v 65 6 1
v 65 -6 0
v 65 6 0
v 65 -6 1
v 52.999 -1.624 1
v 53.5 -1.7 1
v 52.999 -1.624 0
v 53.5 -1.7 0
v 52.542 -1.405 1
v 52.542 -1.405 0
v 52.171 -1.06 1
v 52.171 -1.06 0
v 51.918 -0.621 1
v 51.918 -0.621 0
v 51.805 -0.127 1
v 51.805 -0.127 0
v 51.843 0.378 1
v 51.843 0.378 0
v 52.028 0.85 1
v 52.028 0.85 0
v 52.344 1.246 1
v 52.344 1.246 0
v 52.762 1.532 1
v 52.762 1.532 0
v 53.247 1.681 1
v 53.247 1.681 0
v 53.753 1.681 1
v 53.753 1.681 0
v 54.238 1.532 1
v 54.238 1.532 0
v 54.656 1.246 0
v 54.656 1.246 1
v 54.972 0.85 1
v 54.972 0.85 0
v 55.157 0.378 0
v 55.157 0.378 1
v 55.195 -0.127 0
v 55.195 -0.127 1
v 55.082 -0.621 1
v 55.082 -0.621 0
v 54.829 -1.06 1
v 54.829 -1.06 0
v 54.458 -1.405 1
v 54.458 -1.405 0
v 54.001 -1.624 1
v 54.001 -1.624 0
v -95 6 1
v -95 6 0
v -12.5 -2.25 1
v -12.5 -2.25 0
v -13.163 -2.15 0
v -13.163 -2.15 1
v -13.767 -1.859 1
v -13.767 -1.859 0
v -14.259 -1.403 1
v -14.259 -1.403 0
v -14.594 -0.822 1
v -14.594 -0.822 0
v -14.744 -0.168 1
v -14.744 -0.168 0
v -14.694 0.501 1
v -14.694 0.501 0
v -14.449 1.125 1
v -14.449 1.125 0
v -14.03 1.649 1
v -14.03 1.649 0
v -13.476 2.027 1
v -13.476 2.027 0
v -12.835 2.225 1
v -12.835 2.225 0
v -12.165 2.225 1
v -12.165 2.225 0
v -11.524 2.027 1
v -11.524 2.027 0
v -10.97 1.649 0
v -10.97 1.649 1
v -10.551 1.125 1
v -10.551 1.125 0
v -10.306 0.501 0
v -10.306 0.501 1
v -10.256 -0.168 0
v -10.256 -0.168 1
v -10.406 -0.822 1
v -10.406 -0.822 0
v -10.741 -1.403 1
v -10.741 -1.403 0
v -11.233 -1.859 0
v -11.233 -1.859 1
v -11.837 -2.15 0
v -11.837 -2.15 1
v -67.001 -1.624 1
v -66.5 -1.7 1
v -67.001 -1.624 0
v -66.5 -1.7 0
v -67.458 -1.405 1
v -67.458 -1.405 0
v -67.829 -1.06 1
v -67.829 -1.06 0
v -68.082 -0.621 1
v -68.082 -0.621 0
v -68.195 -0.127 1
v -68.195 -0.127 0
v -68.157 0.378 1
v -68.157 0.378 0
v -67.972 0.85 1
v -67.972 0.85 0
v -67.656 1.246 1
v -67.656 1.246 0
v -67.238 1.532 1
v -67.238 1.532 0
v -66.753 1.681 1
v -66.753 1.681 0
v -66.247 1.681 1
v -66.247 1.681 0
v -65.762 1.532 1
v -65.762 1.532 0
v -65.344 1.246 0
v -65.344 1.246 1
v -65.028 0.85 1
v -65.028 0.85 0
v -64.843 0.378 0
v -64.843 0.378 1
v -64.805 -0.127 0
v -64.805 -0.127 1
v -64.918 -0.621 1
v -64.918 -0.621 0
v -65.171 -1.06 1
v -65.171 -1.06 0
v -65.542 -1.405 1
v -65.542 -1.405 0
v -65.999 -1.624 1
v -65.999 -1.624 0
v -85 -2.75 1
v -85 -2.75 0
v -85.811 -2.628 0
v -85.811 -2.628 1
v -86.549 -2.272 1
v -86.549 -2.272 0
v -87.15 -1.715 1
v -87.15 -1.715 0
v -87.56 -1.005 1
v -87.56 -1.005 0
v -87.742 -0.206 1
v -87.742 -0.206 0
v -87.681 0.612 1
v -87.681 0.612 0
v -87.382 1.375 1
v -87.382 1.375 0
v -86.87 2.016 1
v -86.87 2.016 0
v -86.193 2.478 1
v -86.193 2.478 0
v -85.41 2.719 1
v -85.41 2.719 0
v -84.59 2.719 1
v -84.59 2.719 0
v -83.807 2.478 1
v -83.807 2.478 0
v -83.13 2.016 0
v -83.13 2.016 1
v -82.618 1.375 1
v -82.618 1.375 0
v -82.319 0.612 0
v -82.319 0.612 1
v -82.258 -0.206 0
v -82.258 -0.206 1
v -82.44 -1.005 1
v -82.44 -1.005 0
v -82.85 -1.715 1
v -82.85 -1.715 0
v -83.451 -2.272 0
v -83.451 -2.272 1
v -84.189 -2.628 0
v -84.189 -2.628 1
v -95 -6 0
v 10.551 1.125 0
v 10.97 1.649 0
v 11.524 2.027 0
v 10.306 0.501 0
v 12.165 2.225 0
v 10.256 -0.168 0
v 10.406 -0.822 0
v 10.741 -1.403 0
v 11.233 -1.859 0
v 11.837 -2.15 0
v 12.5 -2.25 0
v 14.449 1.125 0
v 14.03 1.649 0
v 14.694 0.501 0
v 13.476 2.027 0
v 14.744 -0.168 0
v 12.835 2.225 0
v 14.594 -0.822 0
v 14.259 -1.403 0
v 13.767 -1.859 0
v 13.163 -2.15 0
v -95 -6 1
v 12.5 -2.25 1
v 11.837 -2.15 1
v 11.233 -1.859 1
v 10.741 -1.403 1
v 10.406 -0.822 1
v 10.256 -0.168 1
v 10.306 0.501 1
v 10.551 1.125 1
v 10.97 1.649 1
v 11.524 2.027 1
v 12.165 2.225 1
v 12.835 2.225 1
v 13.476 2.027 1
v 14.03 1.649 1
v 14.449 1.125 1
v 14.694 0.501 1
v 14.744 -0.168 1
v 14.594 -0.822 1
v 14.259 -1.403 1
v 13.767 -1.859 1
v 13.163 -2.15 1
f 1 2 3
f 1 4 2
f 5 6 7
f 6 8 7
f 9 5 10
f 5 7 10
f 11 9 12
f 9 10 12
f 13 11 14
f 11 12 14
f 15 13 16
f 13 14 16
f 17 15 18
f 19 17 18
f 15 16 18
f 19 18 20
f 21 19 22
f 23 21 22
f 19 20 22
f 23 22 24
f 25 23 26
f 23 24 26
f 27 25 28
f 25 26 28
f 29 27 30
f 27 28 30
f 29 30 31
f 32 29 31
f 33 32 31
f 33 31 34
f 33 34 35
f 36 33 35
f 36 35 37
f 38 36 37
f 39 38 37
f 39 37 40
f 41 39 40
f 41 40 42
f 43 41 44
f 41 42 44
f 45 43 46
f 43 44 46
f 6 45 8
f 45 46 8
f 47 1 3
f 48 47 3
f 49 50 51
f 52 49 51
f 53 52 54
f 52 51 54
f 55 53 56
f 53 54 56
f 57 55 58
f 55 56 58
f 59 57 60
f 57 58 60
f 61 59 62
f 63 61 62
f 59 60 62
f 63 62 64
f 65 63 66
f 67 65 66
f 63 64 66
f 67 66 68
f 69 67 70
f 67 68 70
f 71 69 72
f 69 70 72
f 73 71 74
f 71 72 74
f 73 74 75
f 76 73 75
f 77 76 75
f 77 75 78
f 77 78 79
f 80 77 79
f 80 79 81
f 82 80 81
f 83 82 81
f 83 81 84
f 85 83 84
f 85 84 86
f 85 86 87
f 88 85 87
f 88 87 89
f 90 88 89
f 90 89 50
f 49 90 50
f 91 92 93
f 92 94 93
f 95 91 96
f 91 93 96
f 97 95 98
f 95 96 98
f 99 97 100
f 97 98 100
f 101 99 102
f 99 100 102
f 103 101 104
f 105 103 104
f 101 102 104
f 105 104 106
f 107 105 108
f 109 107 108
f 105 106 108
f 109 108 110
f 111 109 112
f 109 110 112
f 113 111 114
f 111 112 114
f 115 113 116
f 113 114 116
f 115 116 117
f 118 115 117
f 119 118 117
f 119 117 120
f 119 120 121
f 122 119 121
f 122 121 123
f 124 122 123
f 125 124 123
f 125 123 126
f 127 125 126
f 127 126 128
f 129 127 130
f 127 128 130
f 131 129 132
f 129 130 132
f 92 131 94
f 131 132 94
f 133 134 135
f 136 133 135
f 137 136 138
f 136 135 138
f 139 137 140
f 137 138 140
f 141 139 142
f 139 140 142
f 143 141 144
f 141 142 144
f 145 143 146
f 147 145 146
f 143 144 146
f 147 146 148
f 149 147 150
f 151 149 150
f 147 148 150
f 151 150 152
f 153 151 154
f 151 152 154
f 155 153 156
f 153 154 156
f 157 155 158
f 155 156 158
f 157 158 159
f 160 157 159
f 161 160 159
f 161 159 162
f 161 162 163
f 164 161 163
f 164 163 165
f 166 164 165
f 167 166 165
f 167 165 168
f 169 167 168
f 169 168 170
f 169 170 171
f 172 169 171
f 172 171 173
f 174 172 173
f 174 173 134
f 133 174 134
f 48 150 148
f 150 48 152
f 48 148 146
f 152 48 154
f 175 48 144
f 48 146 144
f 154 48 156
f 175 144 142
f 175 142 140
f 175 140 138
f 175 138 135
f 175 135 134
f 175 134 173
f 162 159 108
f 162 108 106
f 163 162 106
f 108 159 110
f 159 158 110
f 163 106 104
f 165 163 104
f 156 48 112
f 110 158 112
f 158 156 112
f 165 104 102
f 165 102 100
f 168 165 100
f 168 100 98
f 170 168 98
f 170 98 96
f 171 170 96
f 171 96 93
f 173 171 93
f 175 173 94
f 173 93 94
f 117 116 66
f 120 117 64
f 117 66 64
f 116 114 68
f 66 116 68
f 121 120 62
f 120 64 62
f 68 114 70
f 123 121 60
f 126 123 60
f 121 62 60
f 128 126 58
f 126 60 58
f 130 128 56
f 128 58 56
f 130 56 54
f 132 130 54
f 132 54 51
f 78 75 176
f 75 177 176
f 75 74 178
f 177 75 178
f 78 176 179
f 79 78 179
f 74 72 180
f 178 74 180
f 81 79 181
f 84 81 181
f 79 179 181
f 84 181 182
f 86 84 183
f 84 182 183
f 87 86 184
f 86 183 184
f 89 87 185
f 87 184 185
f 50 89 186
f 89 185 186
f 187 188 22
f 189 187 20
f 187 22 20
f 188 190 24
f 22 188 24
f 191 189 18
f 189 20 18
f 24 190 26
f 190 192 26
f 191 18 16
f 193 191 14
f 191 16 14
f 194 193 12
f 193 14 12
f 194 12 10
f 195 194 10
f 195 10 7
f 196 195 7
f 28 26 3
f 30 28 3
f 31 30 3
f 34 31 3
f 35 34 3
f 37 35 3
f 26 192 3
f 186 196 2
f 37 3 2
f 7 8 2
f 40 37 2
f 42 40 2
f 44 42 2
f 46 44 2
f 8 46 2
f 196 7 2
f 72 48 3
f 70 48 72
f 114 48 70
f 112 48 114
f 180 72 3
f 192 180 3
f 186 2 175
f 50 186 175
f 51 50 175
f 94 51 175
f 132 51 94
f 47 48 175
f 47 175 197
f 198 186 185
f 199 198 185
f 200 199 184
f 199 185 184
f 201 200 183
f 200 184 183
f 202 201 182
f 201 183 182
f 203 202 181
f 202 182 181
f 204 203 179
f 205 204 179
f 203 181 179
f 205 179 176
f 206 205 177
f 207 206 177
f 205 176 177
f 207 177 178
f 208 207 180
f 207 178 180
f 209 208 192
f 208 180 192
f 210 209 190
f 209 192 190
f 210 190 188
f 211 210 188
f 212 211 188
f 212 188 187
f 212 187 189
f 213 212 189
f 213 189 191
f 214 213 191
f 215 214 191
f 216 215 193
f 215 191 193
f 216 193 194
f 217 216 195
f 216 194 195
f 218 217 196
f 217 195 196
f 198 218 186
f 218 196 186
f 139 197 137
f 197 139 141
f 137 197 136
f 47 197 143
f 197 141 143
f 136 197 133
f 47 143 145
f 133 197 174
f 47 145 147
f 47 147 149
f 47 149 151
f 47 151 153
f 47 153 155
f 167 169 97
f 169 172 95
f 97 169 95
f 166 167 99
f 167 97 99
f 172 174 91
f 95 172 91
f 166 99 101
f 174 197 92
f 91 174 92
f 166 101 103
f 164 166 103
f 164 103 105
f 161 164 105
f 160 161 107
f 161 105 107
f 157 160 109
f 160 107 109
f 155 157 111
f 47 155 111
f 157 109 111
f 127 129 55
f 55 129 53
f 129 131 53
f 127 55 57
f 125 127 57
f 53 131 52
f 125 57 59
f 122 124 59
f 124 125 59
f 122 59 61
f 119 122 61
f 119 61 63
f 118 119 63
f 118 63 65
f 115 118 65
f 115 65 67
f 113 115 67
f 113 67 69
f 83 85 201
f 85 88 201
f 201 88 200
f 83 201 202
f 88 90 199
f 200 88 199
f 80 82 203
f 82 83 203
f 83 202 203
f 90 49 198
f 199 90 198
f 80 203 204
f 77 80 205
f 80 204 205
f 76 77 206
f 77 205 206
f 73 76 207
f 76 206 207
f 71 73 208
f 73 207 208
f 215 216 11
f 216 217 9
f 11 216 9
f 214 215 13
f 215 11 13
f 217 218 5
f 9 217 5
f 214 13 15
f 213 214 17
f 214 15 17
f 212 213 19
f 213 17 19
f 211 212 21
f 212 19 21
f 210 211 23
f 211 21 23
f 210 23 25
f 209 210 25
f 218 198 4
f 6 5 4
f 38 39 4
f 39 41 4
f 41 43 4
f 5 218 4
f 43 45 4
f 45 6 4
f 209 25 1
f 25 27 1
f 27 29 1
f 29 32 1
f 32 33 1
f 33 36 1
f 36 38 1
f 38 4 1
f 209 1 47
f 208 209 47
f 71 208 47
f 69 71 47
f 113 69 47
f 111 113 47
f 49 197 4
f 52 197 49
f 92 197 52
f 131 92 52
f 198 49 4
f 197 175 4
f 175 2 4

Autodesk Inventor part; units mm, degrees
ref_plane "YZ Plane" through (0, 0, 0) normal (1, 0, 0) x (0, 1, 0)
ref_plane "XZ Plane" through (0, 0, 0) normal (0, 1, 0) x (-1, 0, 0)
ref_plane "XY Plane" through (0, 0, 0) normal (0, 0, 1) x (1, 0, 0)
sketch "Sketch1" plane through (0, 0, 0) normal (0, 0, 1) x (1, 0, 0)
  line L0 (-75, -6) -> (75, -6)
  line L1 (75, -6) -> (75, 6)
  line L2 (75, 6) -> (-75, 6)
  line L3 (-75, 6) -> (-75, -6)
  line L4 (-75, -6) -> (75, 6) construction
  line L5 (75, -6) -> (-75, 6) construction
  point P0 (0, 0)
  dimension "d0" = 150
  dimension "d1" = 12
extrude "Extrusion1" add sketch "Sketch1" along normal blind 1
sketch "Sketch2" plane through (0, 0, 1) normal (0, 0, 1) x (1, 0, 0)
  line L0 (-66.5, 0) -> (-53.5, 0) construction
  line L1 (-53.5, 0) -> (53.5, 0) construction
  line L2 (53.5, 0) -> (66.5, 0) construction
  point P0 (0, 0)
  point P1 (0, 0)
  dimension "d4" = 133
  dimension "d5" = 13
  dimension "d6" = 13
hole "Hole1" at (-66.5, 0, 1) at (53.5, 0, 1) direction (0, 0, -1) diameter 3.4 depth 8 tip angle 118 clearance for "Countersunk Flat Head Screw DIN EN ISO 2009" size "M3" standard "DIN"
sketch "Sketch4" plane through (0, 0, 1) normal (0, 0, 1) x (1, 0, 0)
  line L0 (-12.5, 0) -> (12.5, 0) construction
  point P0 (0, 0)
  point P1 (0, 0)
  dimension "d21" = 25
hole "Hole3" at (-12.5, 0, 1) at (12.5, 0, 1) direction (0, 0, -1) diameter 4.5 depth 8 tip angle 118 clearance for "Countersunk Flat Head Screw DIN EN ISO 2009" size "M4" standard "DIN"
sketch "Sketch6" plane through (-75, -6, 0) normal (-1, 0, 0) x (0, 0, 1)
  line L0 (1, 0) -> (1, 12) projected
  line L1 (0, 0) -> (1, 0)
  line L2 (1, 0) -> (1, 12)
  line L3 (1, 12) -> (0, 12)
  line L4 (0, 12) -> (0, 0)
  point P0 (0, 6)
extrude "Extrusion2" add sketch "Sketch6" along normal blind 20
sketch "Sketch7" plane through (0, 0, 1) normal (0, 0, 1) x (1, 0, 0)
  line L0 (-95, -6) -> (-95, 6) projected
  point P0 (0, 0)
  point P1 (-85, 0)
  dimension "d39" = 10
hole "Hole5" at (-85, 0, 1) direction (0, 0, -1) diameter 5.5 depth 8 tip angle 118 clearance for "Countersunk Flat Head Screw DIN EN ISO 2009" size "M5" standard "DIN"
sketch "Sketch8" plane through (0, 0, 1) normal (0, 0, 1) x (1, 0, 0)
  line L0 (75, -6) -> (-95, -6) projected
  line L1 (75, 6) -> (-95, 6) projected
  line L2 (75, -6) -> (65, -6)
  line L3 (65, -6) -> (65, 6)
  line L4 (65, 6) -> (75, 6)
  line L5 (75, 6) -> (75, -6)
  point P0 (0, 0)
  dimension "d47" = 10
extrude "Extrusion3" cut sketch "Sketch8" against normal blind 10
properties part number "CU6" material "Copper"
